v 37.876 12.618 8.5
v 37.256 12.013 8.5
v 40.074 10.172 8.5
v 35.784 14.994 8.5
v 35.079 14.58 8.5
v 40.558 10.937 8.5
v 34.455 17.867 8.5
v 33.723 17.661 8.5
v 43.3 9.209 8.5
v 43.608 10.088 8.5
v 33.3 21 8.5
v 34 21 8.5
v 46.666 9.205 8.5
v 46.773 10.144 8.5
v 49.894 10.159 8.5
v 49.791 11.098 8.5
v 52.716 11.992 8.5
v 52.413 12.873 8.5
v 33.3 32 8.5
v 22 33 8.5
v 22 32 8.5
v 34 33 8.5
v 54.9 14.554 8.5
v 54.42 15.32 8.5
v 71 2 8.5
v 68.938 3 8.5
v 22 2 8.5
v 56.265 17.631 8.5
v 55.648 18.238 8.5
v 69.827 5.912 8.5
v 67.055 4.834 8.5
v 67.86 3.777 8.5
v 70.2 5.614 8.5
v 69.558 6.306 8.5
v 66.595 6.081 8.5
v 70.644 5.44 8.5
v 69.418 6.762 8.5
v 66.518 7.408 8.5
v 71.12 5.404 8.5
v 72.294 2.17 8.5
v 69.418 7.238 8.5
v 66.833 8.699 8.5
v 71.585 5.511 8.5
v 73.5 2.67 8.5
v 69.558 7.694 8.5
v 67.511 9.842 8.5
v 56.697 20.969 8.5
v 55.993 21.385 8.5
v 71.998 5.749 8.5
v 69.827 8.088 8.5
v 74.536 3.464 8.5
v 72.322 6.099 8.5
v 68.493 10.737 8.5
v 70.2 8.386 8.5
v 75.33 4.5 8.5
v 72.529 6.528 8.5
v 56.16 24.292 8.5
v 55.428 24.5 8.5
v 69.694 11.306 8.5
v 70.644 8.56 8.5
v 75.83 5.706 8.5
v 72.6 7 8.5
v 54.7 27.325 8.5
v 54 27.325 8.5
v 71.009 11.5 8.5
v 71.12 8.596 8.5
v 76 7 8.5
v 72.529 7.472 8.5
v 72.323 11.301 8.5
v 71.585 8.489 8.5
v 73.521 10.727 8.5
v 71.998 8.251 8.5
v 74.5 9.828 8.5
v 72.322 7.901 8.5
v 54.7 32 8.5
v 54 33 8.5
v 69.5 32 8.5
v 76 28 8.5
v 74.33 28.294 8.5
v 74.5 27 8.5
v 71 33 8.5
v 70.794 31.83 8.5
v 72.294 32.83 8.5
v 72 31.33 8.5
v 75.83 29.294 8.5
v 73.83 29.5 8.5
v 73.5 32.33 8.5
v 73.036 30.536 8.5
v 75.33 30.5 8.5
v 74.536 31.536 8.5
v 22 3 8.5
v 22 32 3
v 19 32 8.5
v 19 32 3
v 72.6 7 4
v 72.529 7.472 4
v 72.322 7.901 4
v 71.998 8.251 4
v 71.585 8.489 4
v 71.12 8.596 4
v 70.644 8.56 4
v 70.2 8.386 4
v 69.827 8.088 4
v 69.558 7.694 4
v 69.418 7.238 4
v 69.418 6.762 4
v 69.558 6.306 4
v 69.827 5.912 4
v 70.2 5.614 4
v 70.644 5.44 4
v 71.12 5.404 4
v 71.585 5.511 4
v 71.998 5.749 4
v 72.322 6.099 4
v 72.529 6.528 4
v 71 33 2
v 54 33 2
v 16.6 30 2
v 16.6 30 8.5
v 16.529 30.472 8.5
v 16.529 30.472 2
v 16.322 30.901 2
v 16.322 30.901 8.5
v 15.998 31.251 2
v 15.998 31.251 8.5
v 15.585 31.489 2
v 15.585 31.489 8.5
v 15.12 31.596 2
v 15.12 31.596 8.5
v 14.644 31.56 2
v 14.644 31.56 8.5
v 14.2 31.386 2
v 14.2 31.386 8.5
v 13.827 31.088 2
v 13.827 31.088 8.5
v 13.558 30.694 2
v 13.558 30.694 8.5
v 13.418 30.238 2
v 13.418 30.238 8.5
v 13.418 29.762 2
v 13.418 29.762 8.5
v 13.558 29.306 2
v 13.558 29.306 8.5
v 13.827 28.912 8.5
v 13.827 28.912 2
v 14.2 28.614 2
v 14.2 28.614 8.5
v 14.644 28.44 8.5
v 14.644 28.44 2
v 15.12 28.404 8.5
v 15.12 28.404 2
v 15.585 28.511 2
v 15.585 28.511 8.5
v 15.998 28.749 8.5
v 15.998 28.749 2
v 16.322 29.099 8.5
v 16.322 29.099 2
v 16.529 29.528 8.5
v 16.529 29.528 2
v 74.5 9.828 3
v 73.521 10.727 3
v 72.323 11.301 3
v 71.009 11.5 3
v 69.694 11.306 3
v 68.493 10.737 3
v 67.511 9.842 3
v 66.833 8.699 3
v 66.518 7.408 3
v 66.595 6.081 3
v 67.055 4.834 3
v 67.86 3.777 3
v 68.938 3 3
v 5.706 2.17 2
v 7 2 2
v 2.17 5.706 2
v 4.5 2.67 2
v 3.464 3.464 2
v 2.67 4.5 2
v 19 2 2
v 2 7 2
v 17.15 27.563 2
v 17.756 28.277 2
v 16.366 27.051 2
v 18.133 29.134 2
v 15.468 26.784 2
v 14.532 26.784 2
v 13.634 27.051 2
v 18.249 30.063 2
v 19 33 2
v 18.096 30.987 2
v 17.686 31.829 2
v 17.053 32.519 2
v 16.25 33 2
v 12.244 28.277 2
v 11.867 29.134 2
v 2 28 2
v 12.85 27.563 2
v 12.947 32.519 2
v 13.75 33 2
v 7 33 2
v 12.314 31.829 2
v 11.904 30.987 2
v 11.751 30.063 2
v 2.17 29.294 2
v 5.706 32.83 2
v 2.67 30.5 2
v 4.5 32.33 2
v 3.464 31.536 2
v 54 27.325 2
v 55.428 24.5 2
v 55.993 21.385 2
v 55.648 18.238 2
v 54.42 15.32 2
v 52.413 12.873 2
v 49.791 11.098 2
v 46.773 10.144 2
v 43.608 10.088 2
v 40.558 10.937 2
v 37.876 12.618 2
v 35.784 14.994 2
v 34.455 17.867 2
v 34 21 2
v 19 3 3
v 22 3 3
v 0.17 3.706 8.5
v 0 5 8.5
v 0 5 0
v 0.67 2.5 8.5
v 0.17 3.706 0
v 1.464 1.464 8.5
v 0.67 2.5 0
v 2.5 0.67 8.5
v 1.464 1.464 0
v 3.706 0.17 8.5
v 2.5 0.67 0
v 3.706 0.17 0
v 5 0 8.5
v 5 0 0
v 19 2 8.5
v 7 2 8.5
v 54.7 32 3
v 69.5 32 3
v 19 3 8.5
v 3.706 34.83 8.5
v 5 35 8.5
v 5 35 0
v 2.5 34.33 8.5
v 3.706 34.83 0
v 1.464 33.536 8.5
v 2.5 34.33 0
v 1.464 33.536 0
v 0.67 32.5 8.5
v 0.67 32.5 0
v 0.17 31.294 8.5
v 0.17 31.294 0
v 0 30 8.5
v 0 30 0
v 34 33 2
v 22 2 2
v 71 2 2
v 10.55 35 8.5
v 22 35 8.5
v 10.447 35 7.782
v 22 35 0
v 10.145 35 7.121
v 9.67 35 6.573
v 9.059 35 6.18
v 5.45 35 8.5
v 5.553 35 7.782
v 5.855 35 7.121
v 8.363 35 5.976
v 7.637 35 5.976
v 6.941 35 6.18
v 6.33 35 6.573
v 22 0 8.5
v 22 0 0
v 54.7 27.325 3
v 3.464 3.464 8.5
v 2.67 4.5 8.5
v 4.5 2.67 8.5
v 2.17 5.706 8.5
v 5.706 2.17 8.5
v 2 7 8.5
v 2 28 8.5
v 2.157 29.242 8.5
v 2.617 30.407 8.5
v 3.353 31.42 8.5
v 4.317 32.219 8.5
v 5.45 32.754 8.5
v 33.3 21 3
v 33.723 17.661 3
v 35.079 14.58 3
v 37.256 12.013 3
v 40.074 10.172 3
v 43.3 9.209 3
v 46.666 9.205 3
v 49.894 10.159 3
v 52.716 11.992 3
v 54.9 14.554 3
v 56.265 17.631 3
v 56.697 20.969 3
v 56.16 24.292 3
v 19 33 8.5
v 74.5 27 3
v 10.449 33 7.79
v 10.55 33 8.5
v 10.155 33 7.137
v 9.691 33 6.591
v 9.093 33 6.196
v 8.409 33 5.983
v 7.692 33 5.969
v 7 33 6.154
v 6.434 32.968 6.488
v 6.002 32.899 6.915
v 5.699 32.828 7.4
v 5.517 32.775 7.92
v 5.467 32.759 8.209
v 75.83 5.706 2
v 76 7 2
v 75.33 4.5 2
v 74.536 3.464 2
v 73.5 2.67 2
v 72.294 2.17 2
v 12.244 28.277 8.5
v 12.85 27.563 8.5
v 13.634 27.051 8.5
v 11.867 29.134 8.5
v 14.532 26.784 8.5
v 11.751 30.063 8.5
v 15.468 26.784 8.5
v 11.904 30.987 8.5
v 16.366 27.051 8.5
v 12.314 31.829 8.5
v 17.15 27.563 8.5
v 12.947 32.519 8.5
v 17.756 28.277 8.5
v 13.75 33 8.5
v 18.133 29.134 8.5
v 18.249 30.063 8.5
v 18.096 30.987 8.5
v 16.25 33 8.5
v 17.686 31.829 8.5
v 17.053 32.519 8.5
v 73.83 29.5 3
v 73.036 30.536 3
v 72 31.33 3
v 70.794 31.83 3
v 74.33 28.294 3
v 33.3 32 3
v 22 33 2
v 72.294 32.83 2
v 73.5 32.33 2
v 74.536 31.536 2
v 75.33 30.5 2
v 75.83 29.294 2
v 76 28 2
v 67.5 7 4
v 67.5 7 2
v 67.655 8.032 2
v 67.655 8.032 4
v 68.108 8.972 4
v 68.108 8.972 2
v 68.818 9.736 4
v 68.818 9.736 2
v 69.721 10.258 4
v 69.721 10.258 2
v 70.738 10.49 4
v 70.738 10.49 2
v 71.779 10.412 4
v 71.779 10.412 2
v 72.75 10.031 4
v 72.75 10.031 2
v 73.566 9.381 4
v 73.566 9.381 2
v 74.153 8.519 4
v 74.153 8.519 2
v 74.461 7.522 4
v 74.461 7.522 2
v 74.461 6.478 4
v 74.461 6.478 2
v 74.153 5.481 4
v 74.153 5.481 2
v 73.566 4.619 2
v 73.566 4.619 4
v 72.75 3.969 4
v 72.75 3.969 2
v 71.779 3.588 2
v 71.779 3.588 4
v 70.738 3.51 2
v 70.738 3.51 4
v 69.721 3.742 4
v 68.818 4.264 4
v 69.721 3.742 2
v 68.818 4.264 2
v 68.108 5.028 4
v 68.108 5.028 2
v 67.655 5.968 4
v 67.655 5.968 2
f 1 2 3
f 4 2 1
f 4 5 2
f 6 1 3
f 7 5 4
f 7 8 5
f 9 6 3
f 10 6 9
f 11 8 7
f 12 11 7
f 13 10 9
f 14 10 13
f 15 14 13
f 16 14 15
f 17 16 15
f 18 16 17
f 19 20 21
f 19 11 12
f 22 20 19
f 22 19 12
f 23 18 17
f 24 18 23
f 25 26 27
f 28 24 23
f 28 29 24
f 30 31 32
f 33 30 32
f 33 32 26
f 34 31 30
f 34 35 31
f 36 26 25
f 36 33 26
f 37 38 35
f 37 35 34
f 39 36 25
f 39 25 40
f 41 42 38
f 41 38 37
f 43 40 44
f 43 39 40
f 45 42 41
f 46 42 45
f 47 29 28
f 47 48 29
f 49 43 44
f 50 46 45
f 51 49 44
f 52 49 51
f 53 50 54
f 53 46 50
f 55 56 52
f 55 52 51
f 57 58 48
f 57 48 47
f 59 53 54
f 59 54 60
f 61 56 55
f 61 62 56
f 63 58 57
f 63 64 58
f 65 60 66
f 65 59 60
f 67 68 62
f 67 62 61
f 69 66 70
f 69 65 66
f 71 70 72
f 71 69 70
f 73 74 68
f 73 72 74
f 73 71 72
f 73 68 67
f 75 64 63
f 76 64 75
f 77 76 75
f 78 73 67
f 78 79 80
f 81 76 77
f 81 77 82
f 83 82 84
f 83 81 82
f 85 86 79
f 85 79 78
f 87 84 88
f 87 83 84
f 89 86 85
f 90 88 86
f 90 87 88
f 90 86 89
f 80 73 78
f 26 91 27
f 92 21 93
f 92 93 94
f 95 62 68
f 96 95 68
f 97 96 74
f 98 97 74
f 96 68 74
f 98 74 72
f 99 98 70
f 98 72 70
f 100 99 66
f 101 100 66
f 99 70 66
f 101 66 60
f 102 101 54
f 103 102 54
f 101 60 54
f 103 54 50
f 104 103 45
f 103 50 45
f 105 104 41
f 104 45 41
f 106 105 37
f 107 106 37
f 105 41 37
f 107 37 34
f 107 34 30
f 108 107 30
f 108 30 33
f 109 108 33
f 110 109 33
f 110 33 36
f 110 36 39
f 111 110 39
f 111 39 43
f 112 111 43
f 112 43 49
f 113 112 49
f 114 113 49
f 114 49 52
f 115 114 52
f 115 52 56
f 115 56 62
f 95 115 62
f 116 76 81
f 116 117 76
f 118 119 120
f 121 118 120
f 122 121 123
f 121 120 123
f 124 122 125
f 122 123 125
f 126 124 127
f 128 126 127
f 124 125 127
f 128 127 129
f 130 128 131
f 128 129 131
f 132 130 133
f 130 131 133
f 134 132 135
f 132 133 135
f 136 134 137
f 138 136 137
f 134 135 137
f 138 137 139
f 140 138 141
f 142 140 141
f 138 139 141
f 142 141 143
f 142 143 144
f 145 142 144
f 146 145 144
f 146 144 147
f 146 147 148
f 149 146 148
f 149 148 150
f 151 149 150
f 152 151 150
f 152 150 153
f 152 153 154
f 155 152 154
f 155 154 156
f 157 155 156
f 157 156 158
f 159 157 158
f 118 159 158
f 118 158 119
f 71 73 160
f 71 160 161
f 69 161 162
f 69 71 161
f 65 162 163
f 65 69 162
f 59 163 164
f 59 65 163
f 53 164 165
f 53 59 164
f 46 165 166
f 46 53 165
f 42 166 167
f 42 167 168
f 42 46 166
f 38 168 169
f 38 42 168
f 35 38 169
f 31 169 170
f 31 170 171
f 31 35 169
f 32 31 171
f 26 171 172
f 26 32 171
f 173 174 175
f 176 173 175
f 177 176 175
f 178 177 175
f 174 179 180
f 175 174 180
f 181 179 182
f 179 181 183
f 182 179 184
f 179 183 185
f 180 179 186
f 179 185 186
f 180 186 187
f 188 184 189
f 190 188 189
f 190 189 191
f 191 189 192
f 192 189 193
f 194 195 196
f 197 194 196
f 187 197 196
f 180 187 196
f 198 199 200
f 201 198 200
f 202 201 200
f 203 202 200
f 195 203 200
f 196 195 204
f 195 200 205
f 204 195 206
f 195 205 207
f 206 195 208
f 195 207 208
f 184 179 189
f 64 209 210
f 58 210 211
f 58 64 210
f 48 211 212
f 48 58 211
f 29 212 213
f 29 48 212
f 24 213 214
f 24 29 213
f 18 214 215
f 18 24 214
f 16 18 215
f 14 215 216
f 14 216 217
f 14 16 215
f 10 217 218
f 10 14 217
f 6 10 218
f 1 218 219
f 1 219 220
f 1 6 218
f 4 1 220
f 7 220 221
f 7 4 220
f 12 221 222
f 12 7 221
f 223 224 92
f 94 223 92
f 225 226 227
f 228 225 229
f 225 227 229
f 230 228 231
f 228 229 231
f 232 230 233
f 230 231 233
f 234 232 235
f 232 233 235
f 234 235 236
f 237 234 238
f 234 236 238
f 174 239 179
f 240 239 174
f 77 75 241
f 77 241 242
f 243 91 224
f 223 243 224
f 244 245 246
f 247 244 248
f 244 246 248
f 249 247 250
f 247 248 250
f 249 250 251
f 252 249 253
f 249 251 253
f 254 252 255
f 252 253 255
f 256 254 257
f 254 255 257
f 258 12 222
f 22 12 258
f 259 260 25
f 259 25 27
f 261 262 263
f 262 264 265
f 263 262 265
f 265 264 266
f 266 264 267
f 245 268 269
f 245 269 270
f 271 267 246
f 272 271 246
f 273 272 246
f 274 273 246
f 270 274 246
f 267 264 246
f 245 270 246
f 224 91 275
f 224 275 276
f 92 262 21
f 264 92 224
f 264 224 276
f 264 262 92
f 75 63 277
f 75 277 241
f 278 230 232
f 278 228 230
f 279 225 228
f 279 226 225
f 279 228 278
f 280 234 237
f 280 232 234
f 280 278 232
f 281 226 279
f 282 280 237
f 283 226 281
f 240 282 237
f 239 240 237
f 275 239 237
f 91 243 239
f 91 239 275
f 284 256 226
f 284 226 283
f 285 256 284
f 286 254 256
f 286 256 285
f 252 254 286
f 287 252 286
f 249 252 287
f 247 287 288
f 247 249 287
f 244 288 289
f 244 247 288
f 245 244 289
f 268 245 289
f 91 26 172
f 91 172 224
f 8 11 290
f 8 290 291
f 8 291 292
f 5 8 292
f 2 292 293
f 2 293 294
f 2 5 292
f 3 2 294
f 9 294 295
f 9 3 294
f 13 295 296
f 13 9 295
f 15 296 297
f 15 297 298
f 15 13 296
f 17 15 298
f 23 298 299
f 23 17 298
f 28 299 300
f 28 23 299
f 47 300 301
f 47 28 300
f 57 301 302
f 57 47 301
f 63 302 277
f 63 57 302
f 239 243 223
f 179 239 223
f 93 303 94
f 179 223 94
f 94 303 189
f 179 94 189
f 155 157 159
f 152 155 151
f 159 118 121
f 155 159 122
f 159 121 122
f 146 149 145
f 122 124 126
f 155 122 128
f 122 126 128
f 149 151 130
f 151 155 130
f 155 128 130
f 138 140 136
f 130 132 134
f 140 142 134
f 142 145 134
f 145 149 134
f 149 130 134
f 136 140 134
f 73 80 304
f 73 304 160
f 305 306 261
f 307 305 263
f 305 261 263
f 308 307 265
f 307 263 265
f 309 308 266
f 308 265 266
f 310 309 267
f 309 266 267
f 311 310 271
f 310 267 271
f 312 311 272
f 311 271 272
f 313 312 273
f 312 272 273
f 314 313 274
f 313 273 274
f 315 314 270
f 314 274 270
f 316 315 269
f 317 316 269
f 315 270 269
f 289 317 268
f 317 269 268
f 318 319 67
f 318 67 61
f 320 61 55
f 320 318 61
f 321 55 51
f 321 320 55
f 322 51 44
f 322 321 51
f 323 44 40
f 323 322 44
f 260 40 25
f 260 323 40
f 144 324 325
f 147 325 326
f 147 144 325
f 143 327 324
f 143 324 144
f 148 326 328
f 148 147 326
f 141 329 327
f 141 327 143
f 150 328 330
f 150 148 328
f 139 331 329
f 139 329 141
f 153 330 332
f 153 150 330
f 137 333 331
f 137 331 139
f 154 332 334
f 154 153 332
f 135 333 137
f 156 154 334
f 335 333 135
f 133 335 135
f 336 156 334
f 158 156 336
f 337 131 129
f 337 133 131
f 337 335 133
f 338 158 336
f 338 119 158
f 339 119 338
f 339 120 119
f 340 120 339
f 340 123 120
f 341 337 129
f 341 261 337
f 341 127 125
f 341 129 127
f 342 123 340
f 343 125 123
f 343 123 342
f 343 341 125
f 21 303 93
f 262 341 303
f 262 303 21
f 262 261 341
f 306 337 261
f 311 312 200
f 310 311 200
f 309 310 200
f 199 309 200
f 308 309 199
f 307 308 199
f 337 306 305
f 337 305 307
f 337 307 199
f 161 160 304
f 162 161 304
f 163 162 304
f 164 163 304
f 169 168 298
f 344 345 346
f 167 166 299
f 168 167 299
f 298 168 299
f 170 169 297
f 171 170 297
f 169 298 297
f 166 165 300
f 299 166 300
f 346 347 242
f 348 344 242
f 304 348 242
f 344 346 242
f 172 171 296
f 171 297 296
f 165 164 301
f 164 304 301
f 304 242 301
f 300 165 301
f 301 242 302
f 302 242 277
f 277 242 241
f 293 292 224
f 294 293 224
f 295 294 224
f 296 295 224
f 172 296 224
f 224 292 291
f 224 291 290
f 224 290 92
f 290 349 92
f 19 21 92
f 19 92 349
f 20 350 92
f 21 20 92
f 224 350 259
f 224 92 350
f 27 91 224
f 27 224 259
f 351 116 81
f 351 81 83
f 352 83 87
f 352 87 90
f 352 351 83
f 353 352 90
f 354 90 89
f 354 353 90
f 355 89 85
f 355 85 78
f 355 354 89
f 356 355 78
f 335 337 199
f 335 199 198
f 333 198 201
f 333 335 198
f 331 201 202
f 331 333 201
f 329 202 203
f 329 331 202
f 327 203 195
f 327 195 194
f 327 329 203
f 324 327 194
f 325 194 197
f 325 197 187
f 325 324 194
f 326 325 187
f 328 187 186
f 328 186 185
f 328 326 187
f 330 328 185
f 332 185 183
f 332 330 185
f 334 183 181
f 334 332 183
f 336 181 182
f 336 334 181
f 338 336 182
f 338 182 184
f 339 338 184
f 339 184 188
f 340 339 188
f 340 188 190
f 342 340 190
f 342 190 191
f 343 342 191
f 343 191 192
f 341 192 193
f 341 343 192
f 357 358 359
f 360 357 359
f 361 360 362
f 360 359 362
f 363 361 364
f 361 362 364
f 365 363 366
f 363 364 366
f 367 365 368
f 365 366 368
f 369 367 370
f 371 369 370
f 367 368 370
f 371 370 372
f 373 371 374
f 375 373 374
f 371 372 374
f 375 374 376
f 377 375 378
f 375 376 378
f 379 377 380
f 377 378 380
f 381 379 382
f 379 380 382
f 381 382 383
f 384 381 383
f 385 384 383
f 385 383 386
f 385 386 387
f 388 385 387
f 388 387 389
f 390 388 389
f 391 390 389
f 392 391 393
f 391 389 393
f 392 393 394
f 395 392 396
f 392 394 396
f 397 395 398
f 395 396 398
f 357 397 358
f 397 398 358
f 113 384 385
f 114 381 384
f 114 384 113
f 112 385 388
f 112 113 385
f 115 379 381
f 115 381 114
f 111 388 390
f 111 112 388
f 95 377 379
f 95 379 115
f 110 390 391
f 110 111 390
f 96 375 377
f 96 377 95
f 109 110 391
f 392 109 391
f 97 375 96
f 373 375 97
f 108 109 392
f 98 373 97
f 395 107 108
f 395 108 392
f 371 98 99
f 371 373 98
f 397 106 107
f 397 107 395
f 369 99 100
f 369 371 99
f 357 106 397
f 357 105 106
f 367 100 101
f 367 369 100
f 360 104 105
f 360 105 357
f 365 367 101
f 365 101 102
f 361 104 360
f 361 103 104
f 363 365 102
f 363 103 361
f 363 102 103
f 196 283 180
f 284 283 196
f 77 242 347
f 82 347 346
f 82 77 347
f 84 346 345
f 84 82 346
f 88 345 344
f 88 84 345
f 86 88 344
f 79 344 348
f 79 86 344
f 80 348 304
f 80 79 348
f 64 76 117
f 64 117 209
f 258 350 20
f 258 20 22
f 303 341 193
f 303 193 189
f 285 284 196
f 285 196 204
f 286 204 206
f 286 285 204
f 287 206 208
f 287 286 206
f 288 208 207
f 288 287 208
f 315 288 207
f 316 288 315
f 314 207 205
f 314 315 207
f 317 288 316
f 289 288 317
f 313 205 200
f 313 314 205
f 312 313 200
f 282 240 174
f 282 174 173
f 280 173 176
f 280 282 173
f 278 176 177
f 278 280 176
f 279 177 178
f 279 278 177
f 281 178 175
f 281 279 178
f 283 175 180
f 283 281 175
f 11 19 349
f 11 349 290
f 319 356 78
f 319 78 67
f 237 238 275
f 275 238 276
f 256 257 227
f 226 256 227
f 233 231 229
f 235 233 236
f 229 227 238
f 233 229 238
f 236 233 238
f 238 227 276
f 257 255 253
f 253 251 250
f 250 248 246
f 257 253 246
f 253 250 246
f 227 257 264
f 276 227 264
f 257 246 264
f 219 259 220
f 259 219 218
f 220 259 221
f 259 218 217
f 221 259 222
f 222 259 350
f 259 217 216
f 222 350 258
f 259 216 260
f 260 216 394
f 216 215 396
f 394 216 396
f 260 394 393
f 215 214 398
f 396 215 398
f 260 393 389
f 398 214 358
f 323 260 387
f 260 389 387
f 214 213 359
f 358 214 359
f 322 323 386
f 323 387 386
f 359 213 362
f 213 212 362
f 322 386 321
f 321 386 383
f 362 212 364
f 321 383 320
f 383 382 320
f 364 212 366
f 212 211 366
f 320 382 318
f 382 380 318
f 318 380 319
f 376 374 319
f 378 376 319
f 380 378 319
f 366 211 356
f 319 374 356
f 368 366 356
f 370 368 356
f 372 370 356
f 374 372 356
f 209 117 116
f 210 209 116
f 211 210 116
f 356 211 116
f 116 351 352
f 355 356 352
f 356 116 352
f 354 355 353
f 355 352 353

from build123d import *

# Parameters (mm, degrees)
BOSS_EXTRUDE1_DEPTH  = 17
CUT_EXTRUDE1_START   = -17
SKETCH3_W            = 12
SKETCH3_H            = 2
CUT_EXTRUDE1_DEPTH   = 17
CUT_EXTRUDE2_START   = -2
CUT_EXTRUDE2_DEPTH   = 2
SKETCH5_W            = 60
SKETCH5_H            = 35
CUT_EXTRUDE3_DEPTH   = 2
CUT_EXTRUDE4_DEPTH   = 11
CUT_EXTRUDE11_DEPTH  = 13
BOSS_EXTRUDE2_DEPTH  = 2
SKETCH13_R           = 2.5
CUT_EXTRUDE12_DEPTH  = 5
SKETCH14_R           = 2.55
CUT_EXTRUDE14_DEPTH  = 15
BOSS_EXTRUDE5_REACH  = 87.381
SKETCH15_R           = 3.25
SKETCH15_R_2         = 1.6
SKETCH15_4_R         = 3.25
SKETCH15_4_R_2       = 1.6
CUT_EXTRUDE16_DEPTH  = 1
SKETCH18_R           = 1.6
CUT_EXTRUDE17_DEPTH  = 15
SKETCH20_R           = 4.5
SKETCH20_R_2         = 1.6
BOSS_EXTRUDE6_DEPTH  = 13
SKETCH20_3_R         = 1.6
CUT_EXTRUDE20_DEPTH  = 86.005882191
SKETCH22_W           = 13
SKETCH22_H           = 31
SKETCH22_W_2         = 11
SKETCH22_H_2         = 29
BOSS_EXTRUDE7_DEPTH  = 3
SKETCH21_R           = 3.5
CUT_EXTRUDE21_DEPTH  = 2
SKETCH29_R           = 3.5
CUT_EXTRUDE22_DEPTH  = 2.5
BOSS_EXTRUDE10_DEPTH = 13
SKETCH24_W           = 80
SKETCH24_H           = 36
CUT_EXTRUDE23_DEPTH  = 10


with BuildPart() as part:
    # Sketch1 → Boss-Extrude1 (new body)
    with BuildSketch(Plane.XY):
        with BuildLine():
            ThreePointArc((0, 5), (1.464466094, 1.464466094), (5, 0))
            Line((5, 0), (73, 0))
            ThreePointArc((73, 0), (76.535533906, 1.464466094), (78, 5))
            Line((78, 5), (78, 30))
            ThreePointArc((78, 30), (76.535533906, 33.535533906), (73, 35))
            Line((73, 35), (54, 35))
            Line((54, 35), (54, 27.32455532))
            ThreePointArc((54, 27.32455532), (48.31662479, 10.511911518), (34, 21))
            Line((34, 21), (34, 35))
            Line((34, 35), (5, 35))
            ThreePointArc((5, 35), (1.464466094, 33.535533906), (0, 30))
            Line((0, 30), (0, 5))
        make_face()
    extrude(amount=BOSS_EXTRUDE1_DEPTH)

    # Sketch3 → Cut-Extrude1 (cut)
    with BuildSketch(Plane.XY.offset(17).offset(CUT_EXTRUDE1_START)):
        with Locations((28, 34)):
            Rectangle(SKETCH3_W, SKETCH3_H)
        with BuildLine():
            Line((54, 33), (71, 33))
            ThreePointArc((71, 33), (74.535533906, 31.535533906), (76, 28))
            Line((76, 28), (76, 7))
            ThreePointArc((76, 7), (74.535533906, 3.464466094), (71, 2))
            Line((71, 2), (22, 2))
            Line((22, 2), (22, 0))
            Line((22, 0), (73, 0))
            ThreePointArc((73, 0), (76.535533906, 1.464466094), (78, 5))
            Line((78, 5), (78, 30))
            ThreePointArc((78, 30), (76.535533906, 33.535533906), (73, 35))
            Line((73, 35), (54, 35))
            Line((54, 35), (54, 33))
        make_face()
    extrude(amount=CUT_EXTRUDE1_DEPTH, mode=Mode.SUBTRACT)

    # Sketch3<3> → Cut-Extrude2 (cut)
    with BuildSketch(Plane.XY.offset(17).offset(CUT_EXTRUDE2_START)):
        with BuildLine():
            ThreePointArc((76, 28), (74.535533906, 31.535533906), (71, 33))
            Line((71, 33), (54, 33))
            Line((54, 33), (54, 27.32455532))
            ThreePointArc((54, 27.32455532), (48.31662479, 10.511911518), (34, 21))
            Line((34, 21), (34, 33))
            Line((34, 33), (22, 33))
            Line((22, 33), (22, 2))
            Line((22, 2), (71, 2))
            ThreePointArc((71, 2), (74.535533906, 3.464466094), (76, 7))
            Line((76, 7), (76, 28))
        make_face()
    extrude(amount=CUT_EXTRUDE2_DEPTH, mode=Mode.SUBTRACT)

    # Sketch5 → Cut-Extrude3 (cut)
    with BuildSketch(Plane(origin=(0, 0, 0), x_dir=(-1, 0, 0), z_dir=(0, 0, -1))):
        with Locations((-52, 15.5)):
            Rectangle(SKETCH5_W, SKETCH5_H)
    extrude(amount=-CUT_EXTRUDE3_DEPTH, mode=Mode.SUBTRACT)

    # Sketch6 → Cut-Extrude4 (cut)
    with BuildSketch(Plane.XY.offset(14)):
        with BuildLine():
            Line((22, 32), (69.5, 32))
            ThreePointArc((69.5, 32), (73.035533906, 30.535533906), (74.5, 27))
            Line((74.5, 27), (74.5, 8))
            ThreePointArc((74.5, 8), (73.035533906, 4.464466094), (69.5, 3))
            Line((69.5, 3), (22, 3))
            Line((22, 3), (22, 32))
        make_face()
    extrude(amount=-CUT_EXTRUDE4_DEPTH, mode=Mode.SUBTRACT)

    # Sketch11 → Cut-Extrude11 (cut)
    with BuildSketch(Plane.XY.offset(15)):
        with BuildLine():
            Line((22, 2), (7, 2))
            ThreePointArc((7, 2), (3.464466094, 3.464466094), (2, 7))
            Line((2, 7), (2, 28))
            ThreePointArc((2, 28), (3.464466094, 31.535533906), (7, 33))
            Line((7, 33), (22, 33))
            Line((22, 33), (22, 2))
        make_face()
    extrude(amount=-CUT_EXTRUDE11_DEPTH, mode=Mode.SUBTRACT)


with BuildPart() as cut_extrude11_piece_1:
    # of the separate pieces the step leaves, piece 1, a body of its own (cut_extrude11_pieces)
    add(part.part.solids().sort_by_distance((0, 30, 0))[0])

    # Sketch13 → Cut-Extrude12 (cut)
    with BuildSketch(Plane.XY.offset(17)):
        with Locations((5, 7)):
            Circle(SKETCH13_R)
    extrude(amount=-CUT_EXTRUDE12_DEPTH, mode=Mode.SUBTRACT)

    # Sketch14 → Cut-Extrude14 (cut)
    with BuildSketch(Plane(origin=(0, 35, 0), x_dir=(1, 0, 0), z_dir=(0, 1, 0))):
        with Locations(Location((8, -8.5, 0), (0, 0, 270))):
            Circle(SKETCH14_R)
    extrude(amount=-CUT_EXTRUDE14_DEPTH, mode=Mode.SUBTRACT)

    # Sketch15 → Boss-Extrude5 (add, up to next)
    with BuildSketch(Plane.XY.offset(17), mode=Mode.PRIVATE) as boss_extrude5_sk1:
        with Locations((15, 30)):
            Circle(SKETCH15_R)
        with Locations((15, 30)):
            Circle(SKETCH15_R_2, mode=Mode.SUBTRACT)
    boss_extrude5_tool1 = extrude(boss_extrude5_sk1.sketch, amount=-BOSS_EXTRUDE5_REACH, mode=Mode.PRIVATE) - cut_extrude11_piece_1.part
    add(boss_extrude5_tool1.solids().sort_by_distance((11.841924, 30, 17))[0])

    # Sketch15<4> → Cut-Extrude16 (cut)
    with BuildSketch(Plane.XY.offset(17)):
        with Locations((15, 30)):
            Circle(SKETCH15_4_R)
        with Locations((15, 30)):
            Circle(SKETCH15_4_R_2, mode=Mode.SUBTRACT)
    extrude(amount=-CUT_EXTRUDE16_DEPTH, mode=Mode.SUBTRACT)

    # Sketch18 → Cut-Extrude17 (cut)
    with BuildSketch(Plane.XY.offset(17)):
        with Locations((15, 30)):
            Circle(SKETCH18_R)
    extrude(amount=-CUT_EXTRUDE17_DEPTH, mode=Mode.SUBTRACT)

    # Sketch22 → Boss-Extrude7 (add)
    with BuildSketch(Plane(origin=(22, 0, 0), x_dir=(0, 0, -1), z_dir=(1, 0, 0))):
        with Locations((-8.5, 17.5)):
            Rectangle(SKETCH22_W, SKETCH22_H)
        with Locations((-8.5, 17.5)):
            Rectangle(SKETCH22_W_2, SKETCH22_H_2, mode=Mode.SUBTRACT)
    extrude(amount=-BOSS_EXTRUDE7_DEPTH)


with BuildPart() as cut_extrude11_piece_2:
    # of the separate pieces the step leaves, piece 2, a body of its own (cut_extrude11_pieces)
    add(part.part.solids().sort_by_distance((34, 33, 2))[0])

    # Sketch12 → Boss-Extrude2 (add)
    with BuildSketch(Plane.XY.offset(15)):
        with BuildLine():
            Line((39.5, 5.75), (40.7, 5.75))
            ThreePointArc((40.7, 5.75), (41.053553391, 5.603553391), (41.2, 5.25))
            Line((41.2, 5.25), (41.2, 4.75))
            ThreePointArc((41.2, 4.75), (41.053553391, 4.396446609), (40.7, 4.25))
            Line((40.7, 4.25), (39.5, 4.25))
            ThreePointArc((39.5, 4.25), (39.146446609, 4.396446609), (39, 4.75))
            Line((39, 4.75), (39, 5.25))
            ThreePointArc((39, 5.25), (39.146446609, 5.603553391), (39.5, 5.75))
        make_face()
    extrude(amount=BOSS_EXTRUDE2_DEPTH)

    # Sketch20 → Boss-Extrude6 (add)
    with BuildSketch(Plane.XY.offset(15)):
        with Locations((71, 7)):
            Circle(SKETCH20_R)
        with Locations((71, 7)):
            Circle(SKETCH20_R_2, mode=Mode.SUBTRACT)
    extrude(amount=-BOSS_EXTRUDE6_DEPTH)

    # Sketch20<3> → Cut-Extrude20 (cut, through all)
    with BuildSketch(Plane.XY.offset(15)):
        with Locations((71, 7)):
            Circle(SKETCH20_3_R)
    extrude(amount=-CUT_EXTRUDE20_DEPTH, mode=Mode.SUBTRACT)

    # Sketch21 → Cut-Extrude21 (cut)
    with BuildSketch(Plane(origin=(0, 0, 2), x_dir=(-1, 0, 0), z_dir=(0, 0, -1))):
        with Locations((-71, 7)):
            Circle(SKETCH21_R)
    extrude(amount=-CUT_EXTRUDE21_DEPTH, mode=Mode.SUBTRACT)

    # Sketch29 → Cut-Extrude22 (cut)
    with BuildSketch(Plane.XY.offset(15)):
        with Locations(Location((71, 7, 0), (0, 0, 180))):
            Circle(SKETCH29_R)
    extrude(amount=-CUT_EXTRUDE22_DEPTH, mode=Mode.SUBTRACT)

    # Sketch36 → Boss-Extrude10 (add)
    with BuildSketch(Plane.XY.offset(15)):
        with BuildLine():
            Line((34, 21), (34, 33))
            Line((34, 33), (33.3, 33))
            Line((33.3, 33), (33.3, 21))
            ThreePointArc((33.3, 21), (48.314061384, 9.565059525), (54.7, 27.32455532))
            Line((54.7, 27.32455532), (54.7, 33))
            Line((54.7, 33), (54, 33))
            Line((54, 33), (54, 27.32455532))
            ThreePointArc((54, 27.32455532), (48.31662479, 10.511911518), (34, 21))
        make_face()
    extrude(amount=-BOSS_EXTRUDE10_DEPTH)


with BuildPart() as cut_extrude23_tool:
    # Sketch24 → Cut-Extrude23 (new body)
    with BuildSketch(Plane.XY.offset(8.5)):
        with Locations((40, 18)):
            Rectangle(SKETCH24_W, SKETCH24_H)
    extrude(amount=CUT_EXTRUDE23_DEPTH)


with BuildPart() as cut_extrude11_piece_1_1:
    add(cut_extrude11_piece_1.part)

    # Cut-Extrude23: cut by cut_extrude23_tool
    add(cut_extrude23_tool.part, mode=Mode.SUBTRACT)


with BuildPart() as cut_extrude11_piece_2_1:
    add(cut_extrude11_piece_2.part)

    # Cut-Extrude23: cut by cut_extrude23_tool
    add(cut_extrude23_tool.part, mode=Mode.SUBTRACT)


solid = Compound([cut_extrude11_piece_1_1.part, cut_extrude11_piece_2_1.part])
